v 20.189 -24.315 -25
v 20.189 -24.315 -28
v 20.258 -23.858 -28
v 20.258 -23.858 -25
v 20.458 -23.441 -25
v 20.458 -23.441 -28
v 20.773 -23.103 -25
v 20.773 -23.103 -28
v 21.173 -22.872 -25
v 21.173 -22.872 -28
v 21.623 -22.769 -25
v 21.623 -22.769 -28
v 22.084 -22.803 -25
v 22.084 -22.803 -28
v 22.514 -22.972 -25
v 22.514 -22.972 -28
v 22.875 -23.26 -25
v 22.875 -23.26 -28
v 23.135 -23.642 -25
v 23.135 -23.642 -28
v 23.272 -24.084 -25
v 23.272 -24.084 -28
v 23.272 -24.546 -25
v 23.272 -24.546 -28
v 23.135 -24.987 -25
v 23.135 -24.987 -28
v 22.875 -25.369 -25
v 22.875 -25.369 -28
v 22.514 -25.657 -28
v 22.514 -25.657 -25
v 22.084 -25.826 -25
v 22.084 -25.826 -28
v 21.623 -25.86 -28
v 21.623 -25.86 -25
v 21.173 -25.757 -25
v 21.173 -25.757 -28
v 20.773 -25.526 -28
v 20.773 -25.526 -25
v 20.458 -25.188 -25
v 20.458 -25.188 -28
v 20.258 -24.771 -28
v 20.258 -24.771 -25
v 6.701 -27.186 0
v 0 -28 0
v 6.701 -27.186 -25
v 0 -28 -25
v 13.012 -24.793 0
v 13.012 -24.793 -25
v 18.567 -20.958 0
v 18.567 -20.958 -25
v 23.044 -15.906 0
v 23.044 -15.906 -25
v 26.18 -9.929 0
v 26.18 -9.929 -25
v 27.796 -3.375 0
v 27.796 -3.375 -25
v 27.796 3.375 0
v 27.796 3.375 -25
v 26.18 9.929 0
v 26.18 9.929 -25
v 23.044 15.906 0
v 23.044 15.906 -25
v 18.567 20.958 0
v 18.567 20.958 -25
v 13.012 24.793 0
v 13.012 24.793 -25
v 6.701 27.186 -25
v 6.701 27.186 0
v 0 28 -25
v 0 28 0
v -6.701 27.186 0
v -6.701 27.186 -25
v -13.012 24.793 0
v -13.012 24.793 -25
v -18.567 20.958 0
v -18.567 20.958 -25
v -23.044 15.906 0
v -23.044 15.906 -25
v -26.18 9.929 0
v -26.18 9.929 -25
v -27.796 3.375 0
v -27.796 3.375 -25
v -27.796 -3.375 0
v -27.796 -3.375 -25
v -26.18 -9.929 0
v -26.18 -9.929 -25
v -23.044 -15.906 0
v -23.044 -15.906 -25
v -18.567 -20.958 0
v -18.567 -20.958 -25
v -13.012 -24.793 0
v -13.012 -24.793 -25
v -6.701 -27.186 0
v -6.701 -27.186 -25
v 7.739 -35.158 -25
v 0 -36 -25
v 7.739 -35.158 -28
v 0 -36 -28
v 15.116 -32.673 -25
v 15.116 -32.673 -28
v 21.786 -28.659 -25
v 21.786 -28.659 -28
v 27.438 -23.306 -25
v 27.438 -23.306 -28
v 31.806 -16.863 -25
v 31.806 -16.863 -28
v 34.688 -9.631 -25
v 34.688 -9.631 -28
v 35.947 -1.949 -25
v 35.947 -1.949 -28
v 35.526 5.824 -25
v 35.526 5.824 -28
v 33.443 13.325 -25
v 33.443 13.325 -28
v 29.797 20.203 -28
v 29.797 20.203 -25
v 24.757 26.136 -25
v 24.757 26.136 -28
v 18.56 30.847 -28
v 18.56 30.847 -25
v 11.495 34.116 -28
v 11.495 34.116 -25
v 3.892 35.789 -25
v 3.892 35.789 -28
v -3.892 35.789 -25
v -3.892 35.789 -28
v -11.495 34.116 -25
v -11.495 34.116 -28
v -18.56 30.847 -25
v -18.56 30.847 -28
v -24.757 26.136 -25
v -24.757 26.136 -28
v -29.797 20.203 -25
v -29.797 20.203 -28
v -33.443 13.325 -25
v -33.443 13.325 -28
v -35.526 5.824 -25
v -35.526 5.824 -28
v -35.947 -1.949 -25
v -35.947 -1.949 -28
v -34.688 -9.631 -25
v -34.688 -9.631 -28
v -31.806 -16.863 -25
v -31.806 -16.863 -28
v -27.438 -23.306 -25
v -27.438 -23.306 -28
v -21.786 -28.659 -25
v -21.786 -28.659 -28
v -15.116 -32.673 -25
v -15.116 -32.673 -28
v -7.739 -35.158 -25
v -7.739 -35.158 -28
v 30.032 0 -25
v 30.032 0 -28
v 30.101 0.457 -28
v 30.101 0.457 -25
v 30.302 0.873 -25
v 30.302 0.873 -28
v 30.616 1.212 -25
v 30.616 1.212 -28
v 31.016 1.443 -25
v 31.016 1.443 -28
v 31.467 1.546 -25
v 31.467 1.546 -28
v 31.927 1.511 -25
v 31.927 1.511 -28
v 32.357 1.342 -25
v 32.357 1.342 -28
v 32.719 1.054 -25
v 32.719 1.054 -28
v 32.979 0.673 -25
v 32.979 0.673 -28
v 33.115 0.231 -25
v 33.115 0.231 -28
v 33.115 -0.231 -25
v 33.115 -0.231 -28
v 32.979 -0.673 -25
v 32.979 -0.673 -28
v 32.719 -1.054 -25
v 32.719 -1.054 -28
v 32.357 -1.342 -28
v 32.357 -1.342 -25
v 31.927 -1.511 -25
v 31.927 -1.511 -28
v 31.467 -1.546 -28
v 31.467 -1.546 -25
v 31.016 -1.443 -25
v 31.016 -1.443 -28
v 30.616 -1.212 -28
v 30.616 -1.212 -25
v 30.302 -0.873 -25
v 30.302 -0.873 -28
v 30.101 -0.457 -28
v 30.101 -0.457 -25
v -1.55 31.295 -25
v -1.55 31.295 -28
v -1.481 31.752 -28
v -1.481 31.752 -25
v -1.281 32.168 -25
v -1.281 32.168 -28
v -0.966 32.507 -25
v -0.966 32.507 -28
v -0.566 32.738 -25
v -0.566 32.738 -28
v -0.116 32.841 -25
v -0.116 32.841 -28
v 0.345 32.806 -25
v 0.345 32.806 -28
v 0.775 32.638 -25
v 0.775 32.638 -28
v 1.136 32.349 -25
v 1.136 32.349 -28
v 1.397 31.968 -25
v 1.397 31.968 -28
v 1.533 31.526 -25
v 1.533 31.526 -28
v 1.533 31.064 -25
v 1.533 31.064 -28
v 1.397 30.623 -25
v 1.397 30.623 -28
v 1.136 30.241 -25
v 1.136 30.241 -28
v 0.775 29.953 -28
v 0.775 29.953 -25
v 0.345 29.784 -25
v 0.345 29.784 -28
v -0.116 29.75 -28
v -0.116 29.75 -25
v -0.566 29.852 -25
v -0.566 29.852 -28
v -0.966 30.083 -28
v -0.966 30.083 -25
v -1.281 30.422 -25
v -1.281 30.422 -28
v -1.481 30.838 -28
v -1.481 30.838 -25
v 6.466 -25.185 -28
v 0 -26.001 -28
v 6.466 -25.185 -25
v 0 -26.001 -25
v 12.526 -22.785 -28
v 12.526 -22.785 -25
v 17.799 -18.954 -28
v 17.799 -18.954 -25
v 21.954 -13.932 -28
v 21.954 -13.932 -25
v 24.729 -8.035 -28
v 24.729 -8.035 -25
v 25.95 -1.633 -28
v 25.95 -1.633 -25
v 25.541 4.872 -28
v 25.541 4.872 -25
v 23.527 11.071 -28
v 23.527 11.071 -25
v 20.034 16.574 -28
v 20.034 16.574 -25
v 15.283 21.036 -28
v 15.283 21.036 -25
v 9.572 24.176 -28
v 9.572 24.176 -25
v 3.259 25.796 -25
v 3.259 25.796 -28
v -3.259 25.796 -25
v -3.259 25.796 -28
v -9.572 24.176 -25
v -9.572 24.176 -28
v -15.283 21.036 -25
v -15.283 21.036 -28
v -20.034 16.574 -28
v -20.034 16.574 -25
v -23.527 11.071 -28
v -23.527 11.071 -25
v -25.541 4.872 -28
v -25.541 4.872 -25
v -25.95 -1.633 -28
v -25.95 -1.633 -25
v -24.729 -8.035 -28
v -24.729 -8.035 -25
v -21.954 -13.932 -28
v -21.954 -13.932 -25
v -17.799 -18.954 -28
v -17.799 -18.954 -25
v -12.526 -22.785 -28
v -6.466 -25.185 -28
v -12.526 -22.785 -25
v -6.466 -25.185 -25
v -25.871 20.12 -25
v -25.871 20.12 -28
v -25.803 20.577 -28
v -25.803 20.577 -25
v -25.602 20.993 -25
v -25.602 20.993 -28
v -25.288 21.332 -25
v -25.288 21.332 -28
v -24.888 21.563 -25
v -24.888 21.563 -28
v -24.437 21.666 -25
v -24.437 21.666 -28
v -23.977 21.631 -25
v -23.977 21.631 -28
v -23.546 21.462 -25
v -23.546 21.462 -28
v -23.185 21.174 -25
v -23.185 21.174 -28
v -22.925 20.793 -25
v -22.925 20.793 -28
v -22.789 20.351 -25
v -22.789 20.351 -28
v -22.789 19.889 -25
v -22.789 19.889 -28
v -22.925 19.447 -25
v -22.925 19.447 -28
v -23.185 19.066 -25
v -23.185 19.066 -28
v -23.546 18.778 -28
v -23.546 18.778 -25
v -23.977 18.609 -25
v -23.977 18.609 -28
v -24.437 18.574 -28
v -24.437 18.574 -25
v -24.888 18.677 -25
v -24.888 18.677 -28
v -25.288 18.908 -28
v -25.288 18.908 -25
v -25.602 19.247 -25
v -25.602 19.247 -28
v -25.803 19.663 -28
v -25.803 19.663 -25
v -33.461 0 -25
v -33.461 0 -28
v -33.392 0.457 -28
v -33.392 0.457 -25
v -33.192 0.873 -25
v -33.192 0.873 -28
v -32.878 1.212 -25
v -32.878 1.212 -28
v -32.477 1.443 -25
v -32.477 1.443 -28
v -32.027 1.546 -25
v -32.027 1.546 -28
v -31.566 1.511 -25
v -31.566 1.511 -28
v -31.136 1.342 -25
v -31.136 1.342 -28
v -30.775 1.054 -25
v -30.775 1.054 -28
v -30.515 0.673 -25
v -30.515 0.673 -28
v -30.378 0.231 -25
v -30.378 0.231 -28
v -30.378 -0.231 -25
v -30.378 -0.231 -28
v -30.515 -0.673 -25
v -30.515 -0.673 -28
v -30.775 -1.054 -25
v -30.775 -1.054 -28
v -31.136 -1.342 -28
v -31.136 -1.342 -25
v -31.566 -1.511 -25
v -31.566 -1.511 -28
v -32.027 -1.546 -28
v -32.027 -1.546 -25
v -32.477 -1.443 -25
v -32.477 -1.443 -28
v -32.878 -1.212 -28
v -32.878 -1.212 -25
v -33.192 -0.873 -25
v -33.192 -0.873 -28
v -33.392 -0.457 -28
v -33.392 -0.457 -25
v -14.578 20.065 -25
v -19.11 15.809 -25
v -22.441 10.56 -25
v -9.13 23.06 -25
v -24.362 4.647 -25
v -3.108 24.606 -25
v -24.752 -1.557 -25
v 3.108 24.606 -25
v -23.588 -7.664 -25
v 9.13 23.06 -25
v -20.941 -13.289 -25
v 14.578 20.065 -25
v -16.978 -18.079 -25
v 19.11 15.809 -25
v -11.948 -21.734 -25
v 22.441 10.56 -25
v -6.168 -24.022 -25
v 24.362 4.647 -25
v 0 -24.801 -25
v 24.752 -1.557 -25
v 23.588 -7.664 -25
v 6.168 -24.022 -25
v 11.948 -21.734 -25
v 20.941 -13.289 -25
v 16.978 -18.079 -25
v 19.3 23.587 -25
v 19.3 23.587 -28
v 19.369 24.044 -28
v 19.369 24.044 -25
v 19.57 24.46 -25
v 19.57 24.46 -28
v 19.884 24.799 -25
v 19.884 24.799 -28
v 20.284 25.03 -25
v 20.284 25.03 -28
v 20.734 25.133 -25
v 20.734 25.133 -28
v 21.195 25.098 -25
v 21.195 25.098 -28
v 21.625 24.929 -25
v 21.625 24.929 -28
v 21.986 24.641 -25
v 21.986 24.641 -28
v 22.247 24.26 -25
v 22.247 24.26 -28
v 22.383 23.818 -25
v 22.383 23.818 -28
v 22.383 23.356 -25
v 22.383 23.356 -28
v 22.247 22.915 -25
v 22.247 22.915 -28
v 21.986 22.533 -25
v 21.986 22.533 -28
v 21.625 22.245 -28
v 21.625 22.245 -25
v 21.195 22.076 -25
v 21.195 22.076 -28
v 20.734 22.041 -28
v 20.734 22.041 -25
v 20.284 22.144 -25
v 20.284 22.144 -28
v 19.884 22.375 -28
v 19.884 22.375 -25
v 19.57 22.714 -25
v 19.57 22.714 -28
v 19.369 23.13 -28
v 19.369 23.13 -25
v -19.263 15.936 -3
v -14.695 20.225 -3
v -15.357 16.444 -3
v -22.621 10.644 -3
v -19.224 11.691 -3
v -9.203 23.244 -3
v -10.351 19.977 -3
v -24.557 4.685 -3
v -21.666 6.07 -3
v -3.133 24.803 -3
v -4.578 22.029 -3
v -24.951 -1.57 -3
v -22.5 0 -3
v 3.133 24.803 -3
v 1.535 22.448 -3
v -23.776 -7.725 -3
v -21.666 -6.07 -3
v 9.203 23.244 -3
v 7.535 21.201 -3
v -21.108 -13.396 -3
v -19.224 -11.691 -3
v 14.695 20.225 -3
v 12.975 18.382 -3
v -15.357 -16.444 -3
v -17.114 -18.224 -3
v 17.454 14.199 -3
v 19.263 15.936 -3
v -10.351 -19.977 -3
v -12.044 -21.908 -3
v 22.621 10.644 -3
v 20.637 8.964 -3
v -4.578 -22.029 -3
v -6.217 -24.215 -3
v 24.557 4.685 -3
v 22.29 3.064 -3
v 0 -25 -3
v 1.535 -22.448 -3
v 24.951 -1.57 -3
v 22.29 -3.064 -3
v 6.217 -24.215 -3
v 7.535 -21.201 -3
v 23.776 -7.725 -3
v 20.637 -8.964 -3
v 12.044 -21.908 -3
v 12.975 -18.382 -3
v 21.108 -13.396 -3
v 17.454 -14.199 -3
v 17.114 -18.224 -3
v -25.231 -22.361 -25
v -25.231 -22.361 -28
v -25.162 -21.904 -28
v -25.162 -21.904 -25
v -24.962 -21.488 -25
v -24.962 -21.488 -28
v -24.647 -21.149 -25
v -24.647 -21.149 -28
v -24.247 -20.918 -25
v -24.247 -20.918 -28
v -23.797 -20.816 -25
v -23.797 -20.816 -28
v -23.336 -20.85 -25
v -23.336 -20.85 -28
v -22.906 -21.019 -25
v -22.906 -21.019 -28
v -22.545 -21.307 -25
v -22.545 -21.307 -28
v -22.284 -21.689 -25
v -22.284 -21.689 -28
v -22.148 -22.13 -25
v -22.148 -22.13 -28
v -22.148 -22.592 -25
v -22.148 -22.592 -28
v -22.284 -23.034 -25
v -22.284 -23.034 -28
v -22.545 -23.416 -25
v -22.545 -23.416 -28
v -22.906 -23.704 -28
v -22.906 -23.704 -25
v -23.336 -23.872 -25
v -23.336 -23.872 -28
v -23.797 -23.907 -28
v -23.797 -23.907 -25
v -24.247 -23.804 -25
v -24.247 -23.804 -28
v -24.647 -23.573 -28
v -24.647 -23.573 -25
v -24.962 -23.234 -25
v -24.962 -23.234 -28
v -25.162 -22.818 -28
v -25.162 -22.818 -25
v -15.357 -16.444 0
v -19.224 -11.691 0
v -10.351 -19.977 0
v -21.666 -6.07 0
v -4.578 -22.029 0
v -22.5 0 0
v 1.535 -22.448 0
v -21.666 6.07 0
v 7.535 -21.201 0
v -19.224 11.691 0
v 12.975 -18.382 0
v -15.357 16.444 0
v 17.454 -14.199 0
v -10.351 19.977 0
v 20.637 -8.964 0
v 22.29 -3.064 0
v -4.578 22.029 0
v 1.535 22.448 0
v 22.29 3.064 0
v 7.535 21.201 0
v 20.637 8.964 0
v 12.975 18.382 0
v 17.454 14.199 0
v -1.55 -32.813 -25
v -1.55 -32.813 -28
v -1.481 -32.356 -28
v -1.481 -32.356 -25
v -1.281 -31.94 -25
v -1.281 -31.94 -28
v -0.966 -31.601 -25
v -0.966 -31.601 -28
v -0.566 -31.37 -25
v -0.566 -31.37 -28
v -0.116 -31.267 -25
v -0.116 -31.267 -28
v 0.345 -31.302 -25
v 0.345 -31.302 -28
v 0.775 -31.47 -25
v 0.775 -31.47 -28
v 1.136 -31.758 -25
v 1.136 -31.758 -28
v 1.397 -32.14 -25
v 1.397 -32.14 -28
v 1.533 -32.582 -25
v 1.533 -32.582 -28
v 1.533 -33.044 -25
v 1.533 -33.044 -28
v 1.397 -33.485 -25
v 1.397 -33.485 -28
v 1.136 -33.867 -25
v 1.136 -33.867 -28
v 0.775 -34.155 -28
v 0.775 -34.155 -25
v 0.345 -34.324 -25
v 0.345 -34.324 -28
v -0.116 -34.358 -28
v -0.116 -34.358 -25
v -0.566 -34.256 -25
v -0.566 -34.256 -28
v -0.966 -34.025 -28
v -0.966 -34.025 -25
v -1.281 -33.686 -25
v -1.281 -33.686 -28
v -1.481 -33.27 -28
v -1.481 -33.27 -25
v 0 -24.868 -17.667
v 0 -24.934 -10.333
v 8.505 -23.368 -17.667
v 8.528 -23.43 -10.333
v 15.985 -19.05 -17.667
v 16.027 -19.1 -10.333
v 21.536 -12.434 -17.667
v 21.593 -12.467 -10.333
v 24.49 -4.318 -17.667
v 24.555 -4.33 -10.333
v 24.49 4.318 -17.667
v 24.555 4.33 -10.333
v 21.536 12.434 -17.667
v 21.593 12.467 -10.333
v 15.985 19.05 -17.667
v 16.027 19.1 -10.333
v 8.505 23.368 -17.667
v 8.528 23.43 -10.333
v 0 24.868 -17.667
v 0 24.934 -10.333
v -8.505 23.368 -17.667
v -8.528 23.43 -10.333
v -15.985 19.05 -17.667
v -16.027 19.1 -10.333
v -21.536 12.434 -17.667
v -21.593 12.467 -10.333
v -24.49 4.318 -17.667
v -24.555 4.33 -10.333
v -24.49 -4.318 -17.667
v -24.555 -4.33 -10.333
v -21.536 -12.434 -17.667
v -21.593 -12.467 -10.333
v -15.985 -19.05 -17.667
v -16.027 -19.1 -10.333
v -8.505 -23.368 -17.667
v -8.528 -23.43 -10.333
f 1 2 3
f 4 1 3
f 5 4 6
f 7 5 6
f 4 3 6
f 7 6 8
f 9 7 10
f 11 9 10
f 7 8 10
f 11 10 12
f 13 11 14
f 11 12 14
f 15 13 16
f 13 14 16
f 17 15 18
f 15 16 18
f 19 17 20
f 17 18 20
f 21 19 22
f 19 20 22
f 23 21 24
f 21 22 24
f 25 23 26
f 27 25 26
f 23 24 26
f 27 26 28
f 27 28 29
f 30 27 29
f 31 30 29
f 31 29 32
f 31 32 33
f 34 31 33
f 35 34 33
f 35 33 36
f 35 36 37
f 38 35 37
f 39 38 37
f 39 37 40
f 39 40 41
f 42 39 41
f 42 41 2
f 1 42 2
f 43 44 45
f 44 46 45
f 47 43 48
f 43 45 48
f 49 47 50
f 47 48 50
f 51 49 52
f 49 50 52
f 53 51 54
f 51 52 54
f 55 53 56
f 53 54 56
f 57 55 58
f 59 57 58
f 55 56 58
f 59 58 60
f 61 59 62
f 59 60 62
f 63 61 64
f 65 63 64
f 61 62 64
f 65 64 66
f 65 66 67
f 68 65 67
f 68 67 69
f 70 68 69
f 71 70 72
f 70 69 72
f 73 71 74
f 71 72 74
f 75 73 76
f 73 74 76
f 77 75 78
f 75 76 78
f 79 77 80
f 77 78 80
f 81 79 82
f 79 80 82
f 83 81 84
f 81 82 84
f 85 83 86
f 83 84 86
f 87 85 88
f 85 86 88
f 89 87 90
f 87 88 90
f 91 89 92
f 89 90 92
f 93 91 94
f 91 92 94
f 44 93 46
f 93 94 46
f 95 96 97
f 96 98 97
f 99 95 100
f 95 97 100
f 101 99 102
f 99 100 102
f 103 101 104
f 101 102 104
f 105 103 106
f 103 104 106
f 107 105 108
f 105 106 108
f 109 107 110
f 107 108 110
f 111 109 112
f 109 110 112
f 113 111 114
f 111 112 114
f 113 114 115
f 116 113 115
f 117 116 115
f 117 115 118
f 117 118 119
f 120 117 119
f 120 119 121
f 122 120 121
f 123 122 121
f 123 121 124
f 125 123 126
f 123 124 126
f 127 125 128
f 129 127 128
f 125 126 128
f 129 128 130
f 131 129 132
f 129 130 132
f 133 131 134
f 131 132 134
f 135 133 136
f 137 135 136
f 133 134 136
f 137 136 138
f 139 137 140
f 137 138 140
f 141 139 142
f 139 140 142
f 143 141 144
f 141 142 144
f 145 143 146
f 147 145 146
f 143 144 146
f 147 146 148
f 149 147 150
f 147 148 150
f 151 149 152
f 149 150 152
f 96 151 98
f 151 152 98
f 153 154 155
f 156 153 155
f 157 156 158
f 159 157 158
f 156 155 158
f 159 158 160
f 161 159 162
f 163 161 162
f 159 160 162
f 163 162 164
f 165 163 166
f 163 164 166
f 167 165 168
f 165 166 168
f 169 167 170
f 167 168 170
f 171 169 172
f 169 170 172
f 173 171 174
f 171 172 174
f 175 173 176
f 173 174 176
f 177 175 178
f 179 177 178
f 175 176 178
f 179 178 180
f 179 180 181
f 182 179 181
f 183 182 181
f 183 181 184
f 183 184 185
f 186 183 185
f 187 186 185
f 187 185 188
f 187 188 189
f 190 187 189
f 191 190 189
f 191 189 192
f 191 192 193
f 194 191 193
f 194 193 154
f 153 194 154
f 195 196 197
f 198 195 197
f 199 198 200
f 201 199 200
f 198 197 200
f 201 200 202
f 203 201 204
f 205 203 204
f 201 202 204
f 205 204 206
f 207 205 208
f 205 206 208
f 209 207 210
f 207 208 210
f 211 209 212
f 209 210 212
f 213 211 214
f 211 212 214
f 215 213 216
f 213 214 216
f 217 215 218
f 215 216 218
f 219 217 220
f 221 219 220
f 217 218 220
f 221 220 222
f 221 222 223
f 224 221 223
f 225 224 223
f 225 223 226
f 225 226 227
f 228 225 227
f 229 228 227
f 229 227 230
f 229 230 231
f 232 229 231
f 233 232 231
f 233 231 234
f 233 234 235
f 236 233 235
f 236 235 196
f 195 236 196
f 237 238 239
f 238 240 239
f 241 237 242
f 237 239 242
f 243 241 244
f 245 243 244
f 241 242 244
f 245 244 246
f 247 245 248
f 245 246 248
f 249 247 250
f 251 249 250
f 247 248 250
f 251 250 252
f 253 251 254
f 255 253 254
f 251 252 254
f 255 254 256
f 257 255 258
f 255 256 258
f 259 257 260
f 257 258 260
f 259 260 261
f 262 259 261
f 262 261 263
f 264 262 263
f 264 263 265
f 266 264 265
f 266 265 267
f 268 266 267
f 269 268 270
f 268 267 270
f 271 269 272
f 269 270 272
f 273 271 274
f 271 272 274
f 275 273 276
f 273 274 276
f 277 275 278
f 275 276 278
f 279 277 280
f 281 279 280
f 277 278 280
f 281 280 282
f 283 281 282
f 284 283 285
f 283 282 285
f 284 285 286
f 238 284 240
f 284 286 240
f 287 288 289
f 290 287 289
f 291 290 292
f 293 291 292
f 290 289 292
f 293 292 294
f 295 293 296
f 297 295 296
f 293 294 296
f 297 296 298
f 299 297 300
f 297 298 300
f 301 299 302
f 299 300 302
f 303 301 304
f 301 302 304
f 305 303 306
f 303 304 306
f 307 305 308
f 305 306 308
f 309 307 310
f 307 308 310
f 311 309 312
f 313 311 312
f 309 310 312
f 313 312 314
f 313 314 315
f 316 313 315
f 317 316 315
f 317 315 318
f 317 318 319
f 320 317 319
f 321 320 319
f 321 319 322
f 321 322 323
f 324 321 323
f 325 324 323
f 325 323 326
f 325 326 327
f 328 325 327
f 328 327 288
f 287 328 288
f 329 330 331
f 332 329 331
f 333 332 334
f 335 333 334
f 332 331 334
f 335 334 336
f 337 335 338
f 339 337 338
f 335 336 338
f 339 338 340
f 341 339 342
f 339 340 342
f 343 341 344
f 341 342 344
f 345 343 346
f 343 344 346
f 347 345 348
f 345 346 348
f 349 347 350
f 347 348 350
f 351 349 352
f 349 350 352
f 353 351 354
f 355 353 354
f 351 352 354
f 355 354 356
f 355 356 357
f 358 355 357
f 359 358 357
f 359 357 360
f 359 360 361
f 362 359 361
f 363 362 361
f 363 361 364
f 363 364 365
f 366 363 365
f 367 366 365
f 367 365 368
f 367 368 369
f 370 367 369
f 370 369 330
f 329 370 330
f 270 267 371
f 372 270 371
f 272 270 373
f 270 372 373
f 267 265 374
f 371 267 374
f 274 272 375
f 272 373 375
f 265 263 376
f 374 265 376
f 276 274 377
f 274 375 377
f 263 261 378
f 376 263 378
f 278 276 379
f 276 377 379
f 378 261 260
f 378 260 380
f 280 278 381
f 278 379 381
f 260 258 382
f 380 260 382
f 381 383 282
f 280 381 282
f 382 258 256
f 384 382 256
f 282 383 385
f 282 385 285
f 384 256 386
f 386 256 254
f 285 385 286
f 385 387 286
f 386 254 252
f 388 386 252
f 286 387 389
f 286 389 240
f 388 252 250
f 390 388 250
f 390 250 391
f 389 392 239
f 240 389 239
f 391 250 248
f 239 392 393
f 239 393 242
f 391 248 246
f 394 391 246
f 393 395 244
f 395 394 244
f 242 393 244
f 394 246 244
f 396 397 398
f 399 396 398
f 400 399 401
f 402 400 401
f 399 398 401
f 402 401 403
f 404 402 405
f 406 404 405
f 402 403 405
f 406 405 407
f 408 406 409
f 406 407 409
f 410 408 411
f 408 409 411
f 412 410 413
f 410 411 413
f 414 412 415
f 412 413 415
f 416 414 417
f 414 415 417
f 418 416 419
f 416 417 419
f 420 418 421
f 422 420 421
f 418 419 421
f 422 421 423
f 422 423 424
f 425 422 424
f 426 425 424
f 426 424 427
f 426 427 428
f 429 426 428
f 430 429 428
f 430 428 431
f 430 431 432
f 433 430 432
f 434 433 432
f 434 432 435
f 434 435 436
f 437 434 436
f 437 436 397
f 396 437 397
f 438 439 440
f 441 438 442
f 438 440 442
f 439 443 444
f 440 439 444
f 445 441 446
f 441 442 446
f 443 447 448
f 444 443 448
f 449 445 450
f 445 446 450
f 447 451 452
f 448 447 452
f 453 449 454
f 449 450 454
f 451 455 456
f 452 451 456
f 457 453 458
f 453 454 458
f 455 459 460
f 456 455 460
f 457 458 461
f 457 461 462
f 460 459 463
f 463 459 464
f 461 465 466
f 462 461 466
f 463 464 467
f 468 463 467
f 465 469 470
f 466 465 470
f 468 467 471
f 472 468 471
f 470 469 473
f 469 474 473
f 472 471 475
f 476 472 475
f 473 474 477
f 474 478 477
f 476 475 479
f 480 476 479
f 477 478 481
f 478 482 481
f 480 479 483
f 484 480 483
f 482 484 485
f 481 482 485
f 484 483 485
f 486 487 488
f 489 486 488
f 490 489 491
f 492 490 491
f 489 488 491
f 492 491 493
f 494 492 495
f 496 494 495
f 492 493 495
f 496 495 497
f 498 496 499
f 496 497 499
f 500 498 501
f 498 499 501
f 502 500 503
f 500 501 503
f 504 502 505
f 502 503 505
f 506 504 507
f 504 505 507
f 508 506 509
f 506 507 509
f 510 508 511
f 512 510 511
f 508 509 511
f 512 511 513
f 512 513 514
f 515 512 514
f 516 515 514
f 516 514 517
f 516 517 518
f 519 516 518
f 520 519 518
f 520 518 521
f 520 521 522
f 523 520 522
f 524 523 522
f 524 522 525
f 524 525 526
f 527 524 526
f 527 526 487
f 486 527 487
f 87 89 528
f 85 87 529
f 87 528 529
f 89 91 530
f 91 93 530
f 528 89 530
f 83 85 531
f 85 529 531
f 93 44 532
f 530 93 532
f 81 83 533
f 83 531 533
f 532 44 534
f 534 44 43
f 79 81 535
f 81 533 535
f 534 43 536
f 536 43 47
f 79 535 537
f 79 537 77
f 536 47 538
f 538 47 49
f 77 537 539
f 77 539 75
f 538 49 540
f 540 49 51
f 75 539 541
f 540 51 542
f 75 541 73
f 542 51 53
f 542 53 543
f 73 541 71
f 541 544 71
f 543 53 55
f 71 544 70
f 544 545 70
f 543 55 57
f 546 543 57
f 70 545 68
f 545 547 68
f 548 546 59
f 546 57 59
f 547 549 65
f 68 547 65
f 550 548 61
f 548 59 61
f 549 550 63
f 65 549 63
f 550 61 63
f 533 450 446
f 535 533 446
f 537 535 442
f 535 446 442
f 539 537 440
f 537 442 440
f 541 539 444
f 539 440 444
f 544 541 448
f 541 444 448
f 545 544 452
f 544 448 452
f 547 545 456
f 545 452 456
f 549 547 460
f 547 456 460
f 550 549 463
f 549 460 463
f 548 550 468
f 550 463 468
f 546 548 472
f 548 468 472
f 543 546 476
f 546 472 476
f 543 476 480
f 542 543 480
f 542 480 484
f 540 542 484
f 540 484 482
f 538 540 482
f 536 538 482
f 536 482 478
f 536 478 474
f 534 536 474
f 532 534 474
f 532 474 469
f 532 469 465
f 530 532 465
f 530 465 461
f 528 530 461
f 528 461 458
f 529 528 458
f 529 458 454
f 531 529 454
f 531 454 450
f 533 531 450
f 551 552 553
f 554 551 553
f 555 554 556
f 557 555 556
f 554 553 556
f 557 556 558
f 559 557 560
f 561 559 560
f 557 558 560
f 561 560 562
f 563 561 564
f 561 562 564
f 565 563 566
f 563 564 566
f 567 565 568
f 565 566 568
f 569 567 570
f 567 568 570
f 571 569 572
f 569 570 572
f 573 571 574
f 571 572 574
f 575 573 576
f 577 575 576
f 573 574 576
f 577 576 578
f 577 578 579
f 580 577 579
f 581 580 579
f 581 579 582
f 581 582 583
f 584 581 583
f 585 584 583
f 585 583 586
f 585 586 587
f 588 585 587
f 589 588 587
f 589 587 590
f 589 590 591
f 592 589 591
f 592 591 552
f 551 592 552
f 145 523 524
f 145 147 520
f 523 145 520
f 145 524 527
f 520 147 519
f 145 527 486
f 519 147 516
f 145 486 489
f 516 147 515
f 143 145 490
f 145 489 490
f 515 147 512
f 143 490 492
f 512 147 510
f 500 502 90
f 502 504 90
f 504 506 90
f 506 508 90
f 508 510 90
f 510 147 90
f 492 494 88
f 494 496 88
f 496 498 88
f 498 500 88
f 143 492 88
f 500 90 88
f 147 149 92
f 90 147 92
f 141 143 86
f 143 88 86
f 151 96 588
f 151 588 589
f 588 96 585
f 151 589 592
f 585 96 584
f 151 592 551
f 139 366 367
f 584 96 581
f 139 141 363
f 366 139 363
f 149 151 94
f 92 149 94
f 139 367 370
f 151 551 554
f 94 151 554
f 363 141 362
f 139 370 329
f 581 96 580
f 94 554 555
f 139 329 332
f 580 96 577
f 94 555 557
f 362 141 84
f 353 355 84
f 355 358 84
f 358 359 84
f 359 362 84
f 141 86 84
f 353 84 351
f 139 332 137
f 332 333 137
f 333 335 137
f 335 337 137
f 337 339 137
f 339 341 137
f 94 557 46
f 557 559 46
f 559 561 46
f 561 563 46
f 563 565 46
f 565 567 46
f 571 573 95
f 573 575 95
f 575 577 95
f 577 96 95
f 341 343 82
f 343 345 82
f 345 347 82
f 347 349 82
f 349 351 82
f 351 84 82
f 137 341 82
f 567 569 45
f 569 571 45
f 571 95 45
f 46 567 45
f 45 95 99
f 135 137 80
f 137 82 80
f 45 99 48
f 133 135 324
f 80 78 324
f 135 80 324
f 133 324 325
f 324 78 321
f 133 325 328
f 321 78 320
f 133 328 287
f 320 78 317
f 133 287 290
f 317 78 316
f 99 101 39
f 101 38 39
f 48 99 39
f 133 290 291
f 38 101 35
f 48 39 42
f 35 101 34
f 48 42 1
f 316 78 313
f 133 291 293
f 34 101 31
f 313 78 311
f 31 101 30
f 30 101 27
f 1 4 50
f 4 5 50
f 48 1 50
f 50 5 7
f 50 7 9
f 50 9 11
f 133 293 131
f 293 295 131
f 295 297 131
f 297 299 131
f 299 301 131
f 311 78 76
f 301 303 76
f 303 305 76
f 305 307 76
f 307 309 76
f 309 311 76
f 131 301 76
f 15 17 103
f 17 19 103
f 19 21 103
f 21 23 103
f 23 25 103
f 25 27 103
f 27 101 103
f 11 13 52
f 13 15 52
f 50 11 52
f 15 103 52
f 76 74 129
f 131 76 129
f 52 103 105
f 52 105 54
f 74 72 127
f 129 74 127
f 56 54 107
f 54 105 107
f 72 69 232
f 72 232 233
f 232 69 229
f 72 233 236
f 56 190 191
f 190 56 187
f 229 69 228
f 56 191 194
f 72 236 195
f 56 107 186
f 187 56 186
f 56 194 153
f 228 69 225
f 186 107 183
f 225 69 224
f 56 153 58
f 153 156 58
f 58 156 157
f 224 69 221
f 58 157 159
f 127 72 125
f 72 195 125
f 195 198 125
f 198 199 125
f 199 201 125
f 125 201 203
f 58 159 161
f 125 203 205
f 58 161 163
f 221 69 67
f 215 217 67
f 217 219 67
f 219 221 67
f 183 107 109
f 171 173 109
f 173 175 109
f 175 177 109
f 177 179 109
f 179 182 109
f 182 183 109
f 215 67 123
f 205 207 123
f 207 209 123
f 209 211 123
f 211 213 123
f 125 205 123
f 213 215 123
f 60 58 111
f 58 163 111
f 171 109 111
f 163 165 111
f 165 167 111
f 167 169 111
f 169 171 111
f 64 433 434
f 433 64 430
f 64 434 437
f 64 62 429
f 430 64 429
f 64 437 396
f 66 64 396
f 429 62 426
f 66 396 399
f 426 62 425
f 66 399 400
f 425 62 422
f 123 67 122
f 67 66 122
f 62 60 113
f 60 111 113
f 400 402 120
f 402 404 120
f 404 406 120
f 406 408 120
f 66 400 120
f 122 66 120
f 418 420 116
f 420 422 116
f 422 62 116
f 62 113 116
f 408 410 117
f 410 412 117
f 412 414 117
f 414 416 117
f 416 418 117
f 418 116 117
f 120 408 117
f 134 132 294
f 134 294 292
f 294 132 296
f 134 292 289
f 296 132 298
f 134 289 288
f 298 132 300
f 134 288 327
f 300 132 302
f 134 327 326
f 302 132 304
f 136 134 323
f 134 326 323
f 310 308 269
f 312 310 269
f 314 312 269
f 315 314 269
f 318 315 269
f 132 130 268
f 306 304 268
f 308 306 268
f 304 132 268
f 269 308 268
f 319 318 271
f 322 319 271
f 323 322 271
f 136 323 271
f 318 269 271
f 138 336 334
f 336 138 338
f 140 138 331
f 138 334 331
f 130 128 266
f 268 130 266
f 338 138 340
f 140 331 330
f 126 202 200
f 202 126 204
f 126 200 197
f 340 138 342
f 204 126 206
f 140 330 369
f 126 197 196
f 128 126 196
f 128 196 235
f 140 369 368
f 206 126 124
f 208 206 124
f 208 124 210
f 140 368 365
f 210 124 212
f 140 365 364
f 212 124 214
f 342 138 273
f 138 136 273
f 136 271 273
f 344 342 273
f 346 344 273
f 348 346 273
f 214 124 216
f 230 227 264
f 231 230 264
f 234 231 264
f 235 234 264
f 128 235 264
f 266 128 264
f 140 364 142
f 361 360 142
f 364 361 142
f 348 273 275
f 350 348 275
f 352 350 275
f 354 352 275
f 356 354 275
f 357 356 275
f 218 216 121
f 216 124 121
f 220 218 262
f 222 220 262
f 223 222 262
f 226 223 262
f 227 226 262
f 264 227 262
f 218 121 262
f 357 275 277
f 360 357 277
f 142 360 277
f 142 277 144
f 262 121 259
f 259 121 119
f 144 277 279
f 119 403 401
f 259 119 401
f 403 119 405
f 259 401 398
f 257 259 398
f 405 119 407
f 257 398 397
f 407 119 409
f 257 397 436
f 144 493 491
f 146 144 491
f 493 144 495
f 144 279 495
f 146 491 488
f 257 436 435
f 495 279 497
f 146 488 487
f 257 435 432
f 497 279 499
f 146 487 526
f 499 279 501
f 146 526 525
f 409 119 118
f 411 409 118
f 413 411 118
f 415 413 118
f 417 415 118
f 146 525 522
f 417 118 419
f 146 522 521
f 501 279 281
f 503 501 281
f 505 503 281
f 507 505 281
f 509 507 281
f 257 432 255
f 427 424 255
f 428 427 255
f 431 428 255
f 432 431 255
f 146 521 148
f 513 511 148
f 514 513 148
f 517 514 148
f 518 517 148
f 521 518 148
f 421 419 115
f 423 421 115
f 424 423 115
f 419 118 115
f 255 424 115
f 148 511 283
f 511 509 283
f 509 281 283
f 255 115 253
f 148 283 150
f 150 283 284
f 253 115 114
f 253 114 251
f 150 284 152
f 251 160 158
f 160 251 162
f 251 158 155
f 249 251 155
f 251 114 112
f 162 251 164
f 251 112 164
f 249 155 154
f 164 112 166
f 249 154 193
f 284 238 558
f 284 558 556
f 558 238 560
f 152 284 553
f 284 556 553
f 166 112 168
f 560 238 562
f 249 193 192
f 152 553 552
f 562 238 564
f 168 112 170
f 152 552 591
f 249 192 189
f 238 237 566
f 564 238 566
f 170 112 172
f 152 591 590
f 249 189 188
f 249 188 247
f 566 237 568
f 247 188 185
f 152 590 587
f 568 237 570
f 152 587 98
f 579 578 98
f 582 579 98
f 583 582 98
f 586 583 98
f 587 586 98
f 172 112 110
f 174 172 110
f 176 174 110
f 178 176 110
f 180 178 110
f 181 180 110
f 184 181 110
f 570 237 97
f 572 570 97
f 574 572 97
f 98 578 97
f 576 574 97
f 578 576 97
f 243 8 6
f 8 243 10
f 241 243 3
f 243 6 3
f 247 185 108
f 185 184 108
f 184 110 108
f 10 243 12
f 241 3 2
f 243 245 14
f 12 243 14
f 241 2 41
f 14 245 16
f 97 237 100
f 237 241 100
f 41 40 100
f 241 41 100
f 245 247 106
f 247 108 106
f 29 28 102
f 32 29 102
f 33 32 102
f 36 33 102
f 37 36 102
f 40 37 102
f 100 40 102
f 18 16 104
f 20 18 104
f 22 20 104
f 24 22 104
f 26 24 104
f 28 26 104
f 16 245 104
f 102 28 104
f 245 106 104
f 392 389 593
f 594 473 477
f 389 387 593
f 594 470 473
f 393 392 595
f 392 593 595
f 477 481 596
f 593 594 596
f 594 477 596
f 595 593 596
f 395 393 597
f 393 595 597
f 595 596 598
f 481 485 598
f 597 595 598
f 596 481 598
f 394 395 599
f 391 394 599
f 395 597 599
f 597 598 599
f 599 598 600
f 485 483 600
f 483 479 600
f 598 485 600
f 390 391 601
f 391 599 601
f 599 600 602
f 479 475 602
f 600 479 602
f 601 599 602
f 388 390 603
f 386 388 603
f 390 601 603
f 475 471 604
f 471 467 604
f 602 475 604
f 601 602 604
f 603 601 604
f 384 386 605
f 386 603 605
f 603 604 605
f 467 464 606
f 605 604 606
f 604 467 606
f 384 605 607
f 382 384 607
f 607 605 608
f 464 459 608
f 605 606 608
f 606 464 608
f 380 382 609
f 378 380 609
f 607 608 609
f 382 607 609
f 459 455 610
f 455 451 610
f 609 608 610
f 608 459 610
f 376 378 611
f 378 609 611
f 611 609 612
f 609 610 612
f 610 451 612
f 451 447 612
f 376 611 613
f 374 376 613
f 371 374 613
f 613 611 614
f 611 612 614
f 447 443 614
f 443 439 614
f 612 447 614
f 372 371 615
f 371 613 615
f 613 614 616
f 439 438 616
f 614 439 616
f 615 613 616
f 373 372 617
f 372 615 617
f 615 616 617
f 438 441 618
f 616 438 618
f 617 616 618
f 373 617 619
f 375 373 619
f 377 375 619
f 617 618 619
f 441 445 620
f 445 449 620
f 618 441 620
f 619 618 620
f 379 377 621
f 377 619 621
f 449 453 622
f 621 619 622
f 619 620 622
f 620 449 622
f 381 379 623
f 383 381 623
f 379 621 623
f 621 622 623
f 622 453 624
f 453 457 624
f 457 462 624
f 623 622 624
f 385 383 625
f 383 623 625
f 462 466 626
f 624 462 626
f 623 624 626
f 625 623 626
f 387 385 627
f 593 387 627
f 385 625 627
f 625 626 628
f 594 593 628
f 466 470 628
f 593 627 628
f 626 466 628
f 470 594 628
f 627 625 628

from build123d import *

# Parameters (mm, degrees)
F3_D = 45
F5_D = 3.1


with BuildPart() as f1:
    # F0 (on Right) → F1 (revolve)
    with BuildSketch(Plane.YZ):
        Polygon((0, -3), (0, 0), (-28, 0), (-28, -25), (-36, -25), (-36, -28), (-26.00142, -28), (-26.00142, -25), (-24.80142, -25), (-25, -3), align=None)
    revolve(axis=Axis((0, 0, -1.5), (0, 0, 1)))

    # F3 (through all)
    with Locations(Plane.XY):
        with Locations((0, 0)):
            Hole(F3_D / 2)

    # F5 (through all)
    with Locations(Plane.XY.offset(-25)):
        with Locations((-23.680949, -22.36131), (-31.911136, 0), (-24.321431, 20.12001), (0, 31.295169), (20.850252, 23.587119), (31.582344, 0), (21.738935, -24.314574), (0, -32.812748)):
            Hole(F5_D / 2)


solid = f1.part
